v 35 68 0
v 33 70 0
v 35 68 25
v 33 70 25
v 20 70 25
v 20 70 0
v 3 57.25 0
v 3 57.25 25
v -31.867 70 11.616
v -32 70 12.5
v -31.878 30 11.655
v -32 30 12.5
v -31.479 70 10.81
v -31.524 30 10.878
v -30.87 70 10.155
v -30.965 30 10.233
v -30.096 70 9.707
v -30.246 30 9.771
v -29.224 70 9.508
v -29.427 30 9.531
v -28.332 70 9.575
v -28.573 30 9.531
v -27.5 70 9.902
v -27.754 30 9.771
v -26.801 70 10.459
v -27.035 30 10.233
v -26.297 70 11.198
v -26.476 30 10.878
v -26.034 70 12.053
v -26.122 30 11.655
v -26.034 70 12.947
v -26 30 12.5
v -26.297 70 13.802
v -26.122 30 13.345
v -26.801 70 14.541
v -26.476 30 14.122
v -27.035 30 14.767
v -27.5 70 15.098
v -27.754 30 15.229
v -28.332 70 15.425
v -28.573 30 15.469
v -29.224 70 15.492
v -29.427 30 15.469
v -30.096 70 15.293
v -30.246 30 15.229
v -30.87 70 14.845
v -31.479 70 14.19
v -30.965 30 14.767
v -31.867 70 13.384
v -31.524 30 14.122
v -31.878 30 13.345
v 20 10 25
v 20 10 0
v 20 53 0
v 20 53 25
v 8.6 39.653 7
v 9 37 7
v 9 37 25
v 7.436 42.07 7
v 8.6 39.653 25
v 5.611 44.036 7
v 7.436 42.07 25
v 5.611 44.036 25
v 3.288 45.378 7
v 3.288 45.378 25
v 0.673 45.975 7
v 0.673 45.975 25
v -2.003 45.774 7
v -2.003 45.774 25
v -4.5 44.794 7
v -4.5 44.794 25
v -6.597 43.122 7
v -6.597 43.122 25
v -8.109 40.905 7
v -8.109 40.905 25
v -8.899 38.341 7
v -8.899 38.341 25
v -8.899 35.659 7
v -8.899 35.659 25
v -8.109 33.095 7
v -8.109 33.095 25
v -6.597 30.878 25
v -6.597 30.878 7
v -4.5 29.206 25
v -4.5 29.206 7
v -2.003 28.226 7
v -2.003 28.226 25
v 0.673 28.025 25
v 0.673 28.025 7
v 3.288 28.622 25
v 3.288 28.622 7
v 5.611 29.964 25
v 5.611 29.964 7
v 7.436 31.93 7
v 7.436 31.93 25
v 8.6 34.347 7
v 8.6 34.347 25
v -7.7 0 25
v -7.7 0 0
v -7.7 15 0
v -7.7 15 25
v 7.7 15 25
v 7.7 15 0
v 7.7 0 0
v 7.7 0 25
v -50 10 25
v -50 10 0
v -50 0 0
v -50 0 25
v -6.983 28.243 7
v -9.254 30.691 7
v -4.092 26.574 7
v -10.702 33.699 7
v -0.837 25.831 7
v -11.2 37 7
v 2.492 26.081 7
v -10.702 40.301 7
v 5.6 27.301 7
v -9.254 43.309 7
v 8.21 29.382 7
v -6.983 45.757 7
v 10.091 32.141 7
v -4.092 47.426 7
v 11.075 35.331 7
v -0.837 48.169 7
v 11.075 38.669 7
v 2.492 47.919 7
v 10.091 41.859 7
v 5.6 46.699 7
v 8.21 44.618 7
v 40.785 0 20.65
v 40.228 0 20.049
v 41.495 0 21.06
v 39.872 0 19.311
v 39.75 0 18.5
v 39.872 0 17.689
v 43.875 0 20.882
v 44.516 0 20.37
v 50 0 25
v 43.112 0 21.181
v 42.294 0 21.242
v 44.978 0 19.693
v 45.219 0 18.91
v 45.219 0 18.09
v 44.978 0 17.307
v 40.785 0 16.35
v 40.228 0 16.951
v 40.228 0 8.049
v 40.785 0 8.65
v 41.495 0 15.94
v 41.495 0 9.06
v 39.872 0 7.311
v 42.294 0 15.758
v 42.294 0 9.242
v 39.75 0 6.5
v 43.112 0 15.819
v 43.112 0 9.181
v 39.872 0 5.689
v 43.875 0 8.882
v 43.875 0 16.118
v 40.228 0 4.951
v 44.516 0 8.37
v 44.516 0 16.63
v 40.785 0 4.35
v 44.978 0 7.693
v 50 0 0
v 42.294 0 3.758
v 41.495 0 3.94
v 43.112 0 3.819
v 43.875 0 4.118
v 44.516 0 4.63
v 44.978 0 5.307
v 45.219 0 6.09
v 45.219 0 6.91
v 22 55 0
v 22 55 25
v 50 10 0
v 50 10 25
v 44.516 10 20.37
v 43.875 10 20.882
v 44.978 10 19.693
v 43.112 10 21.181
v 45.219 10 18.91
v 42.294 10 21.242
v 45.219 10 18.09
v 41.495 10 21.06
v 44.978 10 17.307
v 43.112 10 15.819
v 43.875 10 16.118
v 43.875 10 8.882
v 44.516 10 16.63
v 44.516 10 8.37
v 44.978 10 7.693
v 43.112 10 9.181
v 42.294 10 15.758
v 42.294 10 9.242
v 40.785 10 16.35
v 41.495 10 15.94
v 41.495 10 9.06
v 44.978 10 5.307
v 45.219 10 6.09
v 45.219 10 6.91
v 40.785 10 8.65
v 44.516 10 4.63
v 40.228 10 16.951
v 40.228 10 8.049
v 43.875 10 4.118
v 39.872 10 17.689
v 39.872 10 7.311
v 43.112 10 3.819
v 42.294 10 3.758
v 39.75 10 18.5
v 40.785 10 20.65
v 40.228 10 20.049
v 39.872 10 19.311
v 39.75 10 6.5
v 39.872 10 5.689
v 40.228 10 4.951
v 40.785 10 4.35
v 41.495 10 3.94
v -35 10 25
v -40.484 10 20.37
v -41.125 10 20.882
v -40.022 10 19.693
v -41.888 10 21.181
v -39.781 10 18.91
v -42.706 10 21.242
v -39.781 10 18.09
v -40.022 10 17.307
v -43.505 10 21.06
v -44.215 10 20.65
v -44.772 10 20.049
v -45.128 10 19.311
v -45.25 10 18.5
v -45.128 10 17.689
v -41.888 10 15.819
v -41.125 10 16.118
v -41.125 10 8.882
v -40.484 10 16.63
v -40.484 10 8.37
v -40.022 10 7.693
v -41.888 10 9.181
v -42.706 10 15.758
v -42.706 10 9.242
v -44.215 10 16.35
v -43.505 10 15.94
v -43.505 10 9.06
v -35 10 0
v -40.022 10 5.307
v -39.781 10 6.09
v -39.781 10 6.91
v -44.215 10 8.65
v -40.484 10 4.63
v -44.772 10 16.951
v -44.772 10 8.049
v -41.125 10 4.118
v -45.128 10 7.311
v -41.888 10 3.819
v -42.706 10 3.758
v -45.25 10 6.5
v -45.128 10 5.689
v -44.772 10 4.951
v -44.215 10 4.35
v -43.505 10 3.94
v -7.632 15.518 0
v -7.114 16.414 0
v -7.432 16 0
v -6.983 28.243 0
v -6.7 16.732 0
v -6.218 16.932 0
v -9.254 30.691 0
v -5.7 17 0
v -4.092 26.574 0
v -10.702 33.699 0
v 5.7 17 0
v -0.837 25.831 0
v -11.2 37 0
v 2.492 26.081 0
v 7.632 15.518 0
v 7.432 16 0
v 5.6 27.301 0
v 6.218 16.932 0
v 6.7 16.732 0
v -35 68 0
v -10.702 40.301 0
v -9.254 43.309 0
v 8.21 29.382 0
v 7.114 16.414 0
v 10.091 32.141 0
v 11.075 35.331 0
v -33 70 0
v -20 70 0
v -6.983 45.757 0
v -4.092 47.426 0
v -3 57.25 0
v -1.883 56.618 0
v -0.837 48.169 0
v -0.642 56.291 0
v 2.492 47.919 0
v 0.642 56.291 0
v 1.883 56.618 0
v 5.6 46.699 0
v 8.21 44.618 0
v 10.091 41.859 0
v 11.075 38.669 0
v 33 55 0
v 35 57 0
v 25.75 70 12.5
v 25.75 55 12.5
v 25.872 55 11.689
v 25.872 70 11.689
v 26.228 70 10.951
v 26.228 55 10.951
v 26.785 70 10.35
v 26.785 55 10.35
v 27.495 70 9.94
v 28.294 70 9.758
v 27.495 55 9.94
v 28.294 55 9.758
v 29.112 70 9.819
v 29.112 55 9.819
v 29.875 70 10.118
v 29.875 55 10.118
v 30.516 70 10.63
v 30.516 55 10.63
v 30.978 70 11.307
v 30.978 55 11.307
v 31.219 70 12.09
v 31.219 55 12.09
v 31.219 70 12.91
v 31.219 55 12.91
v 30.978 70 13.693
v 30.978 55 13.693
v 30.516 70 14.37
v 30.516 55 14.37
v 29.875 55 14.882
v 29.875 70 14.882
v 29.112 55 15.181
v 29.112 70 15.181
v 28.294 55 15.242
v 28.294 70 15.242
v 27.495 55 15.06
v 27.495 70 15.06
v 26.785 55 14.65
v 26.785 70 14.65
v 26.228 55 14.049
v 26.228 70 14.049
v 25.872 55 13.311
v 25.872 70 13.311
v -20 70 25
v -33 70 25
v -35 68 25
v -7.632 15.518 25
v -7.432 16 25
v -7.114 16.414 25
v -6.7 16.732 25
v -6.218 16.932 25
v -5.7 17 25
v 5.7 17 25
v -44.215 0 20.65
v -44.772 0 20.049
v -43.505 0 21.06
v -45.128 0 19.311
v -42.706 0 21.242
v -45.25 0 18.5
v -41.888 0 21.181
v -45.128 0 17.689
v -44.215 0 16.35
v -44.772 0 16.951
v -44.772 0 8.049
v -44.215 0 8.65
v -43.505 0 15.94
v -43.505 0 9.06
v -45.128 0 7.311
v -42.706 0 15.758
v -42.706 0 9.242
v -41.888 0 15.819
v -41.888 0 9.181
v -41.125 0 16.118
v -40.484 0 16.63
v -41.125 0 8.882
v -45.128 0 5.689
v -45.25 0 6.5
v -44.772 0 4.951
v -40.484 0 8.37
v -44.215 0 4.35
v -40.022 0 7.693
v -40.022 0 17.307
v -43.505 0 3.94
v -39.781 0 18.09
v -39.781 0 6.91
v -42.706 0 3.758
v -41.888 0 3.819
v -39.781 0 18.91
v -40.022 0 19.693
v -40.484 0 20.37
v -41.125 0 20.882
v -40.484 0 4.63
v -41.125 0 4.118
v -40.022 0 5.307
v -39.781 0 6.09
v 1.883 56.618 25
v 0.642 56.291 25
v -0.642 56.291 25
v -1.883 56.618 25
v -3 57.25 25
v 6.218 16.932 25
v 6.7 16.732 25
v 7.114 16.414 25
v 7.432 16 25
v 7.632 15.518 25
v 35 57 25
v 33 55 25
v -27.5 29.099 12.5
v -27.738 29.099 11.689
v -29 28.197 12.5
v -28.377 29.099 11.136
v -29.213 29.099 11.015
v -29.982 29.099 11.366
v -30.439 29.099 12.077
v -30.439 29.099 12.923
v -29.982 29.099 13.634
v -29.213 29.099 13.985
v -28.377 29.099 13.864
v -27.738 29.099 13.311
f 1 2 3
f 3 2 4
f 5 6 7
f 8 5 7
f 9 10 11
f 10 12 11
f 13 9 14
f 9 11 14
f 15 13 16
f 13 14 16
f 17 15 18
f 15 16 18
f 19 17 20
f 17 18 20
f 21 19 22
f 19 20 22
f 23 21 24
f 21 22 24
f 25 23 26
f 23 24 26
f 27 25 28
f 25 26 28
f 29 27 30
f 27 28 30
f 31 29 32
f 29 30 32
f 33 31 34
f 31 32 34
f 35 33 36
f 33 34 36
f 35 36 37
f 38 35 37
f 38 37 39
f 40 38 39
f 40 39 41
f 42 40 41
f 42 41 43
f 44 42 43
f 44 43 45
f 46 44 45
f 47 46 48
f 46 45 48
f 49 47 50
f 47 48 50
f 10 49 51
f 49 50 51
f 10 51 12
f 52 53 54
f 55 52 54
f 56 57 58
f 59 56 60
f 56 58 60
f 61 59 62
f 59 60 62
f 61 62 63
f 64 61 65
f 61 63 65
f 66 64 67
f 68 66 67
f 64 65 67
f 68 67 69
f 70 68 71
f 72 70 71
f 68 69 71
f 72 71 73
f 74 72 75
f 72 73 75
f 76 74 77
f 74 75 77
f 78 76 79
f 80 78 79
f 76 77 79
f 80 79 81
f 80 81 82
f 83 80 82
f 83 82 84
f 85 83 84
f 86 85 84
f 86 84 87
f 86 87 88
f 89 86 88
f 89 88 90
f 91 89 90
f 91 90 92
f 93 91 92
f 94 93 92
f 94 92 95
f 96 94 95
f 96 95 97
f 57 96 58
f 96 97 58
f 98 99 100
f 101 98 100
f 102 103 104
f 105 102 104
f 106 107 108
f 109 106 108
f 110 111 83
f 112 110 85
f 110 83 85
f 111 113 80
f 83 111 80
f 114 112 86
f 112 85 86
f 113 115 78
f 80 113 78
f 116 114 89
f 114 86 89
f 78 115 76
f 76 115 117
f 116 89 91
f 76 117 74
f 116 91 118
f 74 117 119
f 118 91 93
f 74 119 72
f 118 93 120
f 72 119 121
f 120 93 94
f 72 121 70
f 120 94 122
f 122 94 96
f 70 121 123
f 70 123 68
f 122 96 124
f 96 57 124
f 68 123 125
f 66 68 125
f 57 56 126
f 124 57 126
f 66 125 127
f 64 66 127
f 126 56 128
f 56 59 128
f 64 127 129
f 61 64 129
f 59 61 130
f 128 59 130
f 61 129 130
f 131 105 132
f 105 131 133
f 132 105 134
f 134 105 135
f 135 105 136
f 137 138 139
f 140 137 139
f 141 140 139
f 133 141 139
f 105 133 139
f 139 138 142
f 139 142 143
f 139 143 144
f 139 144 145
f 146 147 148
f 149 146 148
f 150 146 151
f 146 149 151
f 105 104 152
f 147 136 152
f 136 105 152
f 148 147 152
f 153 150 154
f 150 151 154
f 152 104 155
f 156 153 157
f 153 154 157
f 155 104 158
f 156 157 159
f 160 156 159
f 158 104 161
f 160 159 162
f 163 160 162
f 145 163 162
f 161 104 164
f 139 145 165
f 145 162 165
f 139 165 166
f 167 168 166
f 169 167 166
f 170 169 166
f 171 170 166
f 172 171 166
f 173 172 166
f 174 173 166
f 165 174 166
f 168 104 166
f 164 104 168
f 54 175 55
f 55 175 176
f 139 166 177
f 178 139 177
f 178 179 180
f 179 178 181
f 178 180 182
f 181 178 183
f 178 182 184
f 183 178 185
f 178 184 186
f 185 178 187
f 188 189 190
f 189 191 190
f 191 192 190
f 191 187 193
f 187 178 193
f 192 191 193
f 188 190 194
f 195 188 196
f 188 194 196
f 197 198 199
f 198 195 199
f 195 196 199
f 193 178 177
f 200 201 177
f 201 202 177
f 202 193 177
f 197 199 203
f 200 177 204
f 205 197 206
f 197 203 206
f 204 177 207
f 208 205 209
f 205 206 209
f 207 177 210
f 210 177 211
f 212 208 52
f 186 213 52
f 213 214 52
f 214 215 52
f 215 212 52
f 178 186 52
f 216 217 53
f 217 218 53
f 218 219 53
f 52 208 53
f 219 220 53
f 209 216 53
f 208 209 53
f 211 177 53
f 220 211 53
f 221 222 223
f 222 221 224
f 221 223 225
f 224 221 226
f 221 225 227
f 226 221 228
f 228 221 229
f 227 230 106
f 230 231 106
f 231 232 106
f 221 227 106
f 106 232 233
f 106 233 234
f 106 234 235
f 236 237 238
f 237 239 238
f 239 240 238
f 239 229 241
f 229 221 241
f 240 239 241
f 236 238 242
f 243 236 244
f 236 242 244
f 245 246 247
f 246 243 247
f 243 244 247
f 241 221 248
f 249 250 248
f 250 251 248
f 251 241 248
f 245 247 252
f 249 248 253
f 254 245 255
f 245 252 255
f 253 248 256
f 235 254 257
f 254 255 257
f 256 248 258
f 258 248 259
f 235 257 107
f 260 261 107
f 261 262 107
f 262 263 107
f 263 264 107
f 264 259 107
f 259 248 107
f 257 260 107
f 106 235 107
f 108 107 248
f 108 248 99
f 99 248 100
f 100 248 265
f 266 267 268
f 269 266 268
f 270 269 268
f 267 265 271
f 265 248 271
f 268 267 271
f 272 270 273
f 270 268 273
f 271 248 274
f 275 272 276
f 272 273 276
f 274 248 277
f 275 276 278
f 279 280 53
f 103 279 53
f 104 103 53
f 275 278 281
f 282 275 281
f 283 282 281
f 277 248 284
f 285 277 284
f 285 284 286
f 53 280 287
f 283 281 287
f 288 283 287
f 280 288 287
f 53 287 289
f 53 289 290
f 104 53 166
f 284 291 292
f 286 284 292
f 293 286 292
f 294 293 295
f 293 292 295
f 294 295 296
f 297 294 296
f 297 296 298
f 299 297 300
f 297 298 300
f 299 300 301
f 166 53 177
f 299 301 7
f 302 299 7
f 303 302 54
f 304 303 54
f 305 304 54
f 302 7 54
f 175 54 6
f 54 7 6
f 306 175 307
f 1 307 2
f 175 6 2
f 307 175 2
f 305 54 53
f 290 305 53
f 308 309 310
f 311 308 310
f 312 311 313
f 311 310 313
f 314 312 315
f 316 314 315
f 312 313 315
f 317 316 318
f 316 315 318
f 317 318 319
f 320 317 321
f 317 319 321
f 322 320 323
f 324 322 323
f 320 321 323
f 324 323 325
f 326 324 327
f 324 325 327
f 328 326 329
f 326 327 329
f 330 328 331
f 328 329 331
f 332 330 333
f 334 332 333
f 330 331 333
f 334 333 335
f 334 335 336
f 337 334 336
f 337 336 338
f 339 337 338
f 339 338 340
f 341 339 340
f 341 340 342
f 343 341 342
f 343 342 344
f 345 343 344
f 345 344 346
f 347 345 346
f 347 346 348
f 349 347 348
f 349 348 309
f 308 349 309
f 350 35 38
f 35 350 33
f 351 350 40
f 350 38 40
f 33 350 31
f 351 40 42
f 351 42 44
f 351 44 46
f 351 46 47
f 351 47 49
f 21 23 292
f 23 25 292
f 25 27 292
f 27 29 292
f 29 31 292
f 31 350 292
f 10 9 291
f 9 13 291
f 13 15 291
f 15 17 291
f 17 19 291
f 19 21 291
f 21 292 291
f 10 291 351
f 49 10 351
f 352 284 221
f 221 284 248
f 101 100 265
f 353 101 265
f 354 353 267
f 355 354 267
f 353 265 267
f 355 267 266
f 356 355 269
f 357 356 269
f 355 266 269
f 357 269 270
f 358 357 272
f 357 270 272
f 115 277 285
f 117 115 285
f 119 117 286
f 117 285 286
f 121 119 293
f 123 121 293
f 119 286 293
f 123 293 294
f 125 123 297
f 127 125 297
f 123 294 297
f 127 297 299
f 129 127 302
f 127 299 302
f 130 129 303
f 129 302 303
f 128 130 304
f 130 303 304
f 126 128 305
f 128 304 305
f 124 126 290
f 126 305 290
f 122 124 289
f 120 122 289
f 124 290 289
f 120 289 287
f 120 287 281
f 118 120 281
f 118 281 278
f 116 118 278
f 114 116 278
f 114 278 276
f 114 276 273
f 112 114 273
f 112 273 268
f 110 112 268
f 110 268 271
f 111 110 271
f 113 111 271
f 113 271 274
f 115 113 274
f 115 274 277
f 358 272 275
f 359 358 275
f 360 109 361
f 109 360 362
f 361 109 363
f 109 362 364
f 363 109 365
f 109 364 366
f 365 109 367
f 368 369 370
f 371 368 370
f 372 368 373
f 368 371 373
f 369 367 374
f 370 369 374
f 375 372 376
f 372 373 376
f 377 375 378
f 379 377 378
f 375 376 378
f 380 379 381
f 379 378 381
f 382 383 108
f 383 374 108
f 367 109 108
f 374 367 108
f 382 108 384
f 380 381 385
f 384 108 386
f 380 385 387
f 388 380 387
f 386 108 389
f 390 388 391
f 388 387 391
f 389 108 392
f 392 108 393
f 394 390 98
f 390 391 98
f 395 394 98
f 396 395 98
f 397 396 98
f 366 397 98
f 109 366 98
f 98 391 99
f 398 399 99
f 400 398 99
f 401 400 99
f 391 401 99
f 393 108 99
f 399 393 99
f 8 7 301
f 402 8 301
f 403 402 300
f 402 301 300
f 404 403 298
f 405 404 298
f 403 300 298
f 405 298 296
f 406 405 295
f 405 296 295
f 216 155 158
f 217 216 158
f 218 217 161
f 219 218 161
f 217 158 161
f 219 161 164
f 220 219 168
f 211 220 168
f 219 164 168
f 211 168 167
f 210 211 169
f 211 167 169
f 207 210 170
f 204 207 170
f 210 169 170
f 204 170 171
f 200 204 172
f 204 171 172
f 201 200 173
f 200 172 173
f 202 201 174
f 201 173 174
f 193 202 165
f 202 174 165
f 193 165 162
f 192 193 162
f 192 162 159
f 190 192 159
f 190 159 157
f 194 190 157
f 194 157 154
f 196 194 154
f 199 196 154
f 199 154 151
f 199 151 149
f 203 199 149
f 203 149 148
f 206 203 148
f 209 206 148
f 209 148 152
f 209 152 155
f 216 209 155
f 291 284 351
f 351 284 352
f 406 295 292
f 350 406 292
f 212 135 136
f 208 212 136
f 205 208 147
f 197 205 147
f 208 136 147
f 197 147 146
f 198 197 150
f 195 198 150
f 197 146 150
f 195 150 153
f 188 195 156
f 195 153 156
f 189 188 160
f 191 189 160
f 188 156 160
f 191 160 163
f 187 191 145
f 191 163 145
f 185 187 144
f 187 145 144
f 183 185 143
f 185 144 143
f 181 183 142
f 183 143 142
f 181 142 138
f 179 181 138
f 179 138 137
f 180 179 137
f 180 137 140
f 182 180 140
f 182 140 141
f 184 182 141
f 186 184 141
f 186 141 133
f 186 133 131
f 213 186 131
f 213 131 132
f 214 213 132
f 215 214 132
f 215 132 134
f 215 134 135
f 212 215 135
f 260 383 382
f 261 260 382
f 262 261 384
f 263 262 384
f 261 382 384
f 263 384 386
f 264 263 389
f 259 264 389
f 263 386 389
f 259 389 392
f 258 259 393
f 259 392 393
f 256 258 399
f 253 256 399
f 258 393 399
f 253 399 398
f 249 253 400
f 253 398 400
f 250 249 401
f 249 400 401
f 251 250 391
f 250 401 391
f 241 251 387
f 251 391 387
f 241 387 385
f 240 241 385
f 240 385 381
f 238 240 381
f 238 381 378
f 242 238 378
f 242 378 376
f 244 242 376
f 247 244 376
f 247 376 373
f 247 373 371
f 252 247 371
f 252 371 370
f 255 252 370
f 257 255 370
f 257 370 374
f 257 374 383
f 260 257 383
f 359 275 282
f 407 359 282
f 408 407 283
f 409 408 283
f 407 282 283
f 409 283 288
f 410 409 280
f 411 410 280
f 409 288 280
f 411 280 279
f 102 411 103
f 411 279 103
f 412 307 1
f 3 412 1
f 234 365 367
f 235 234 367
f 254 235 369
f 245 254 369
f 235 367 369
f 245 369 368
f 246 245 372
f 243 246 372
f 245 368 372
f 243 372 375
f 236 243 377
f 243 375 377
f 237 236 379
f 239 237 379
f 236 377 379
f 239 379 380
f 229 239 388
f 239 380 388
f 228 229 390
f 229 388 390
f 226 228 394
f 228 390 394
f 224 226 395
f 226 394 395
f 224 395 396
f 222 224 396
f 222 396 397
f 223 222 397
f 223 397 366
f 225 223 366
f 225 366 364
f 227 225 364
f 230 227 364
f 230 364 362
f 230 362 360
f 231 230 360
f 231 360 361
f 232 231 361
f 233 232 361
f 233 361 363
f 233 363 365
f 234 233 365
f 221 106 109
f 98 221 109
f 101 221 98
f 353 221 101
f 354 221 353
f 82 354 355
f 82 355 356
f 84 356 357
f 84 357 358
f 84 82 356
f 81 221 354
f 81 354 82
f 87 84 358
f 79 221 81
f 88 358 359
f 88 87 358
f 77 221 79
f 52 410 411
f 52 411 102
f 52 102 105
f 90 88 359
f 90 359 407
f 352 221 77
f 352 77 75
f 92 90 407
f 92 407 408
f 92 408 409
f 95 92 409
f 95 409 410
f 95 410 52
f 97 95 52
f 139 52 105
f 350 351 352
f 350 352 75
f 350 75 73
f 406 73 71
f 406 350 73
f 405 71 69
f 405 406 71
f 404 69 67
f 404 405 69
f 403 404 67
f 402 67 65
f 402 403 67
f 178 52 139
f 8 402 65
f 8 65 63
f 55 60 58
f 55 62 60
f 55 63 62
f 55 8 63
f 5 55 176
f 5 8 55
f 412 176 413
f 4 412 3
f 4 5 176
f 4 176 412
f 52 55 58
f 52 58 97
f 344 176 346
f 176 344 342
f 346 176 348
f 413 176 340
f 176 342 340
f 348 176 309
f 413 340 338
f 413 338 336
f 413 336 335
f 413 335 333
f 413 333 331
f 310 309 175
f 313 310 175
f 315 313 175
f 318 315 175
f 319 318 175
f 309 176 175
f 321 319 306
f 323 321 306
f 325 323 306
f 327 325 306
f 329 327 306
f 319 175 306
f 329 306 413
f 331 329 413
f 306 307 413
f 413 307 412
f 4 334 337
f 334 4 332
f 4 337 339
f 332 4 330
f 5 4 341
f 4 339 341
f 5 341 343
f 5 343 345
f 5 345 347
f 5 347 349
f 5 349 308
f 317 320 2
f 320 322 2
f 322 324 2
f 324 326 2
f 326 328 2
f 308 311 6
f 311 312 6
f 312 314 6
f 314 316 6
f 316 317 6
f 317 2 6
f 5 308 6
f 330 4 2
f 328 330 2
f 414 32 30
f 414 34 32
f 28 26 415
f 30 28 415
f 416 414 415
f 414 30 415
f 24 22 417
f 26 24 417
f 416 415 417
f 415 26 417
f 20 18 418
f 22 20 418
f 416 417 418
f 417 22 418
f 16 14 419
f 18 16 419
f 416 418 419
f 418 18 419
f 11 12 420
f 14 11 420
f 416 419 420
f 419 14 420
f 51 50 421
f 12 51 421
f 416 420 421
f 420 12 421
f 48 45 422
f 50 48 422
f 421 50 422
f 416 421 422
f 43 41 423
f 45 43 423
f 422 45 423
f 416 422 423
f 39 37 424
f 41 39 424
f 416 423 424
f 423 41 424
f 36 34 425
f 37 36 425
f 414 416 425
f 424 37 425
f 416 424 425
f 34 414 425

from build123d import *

# Parameters (mm, degrees)
BOSS_EXTRUDE1_DEPTH       = 25
SKETCH2_R                 = 11.2
CUT_EXTRUDE1_DEPTH        = 90.582364336
CHAMFER2_SIZE             = 2
SKETCH11_R                = 11.4
SKETCH11_R_2              = 9
BOSS_EXTRUDE3_DEPTH       = 18
M5_CLEARANCE_HOLE1_D      = 5.5
M5_CLEARANCE_HOLE2_D      = 5.5
M5_CLEARANCE_HOLE2_DEPTH  = 15
F_6_0MM_DOWEL_HOLE1_D     = 6
F_6_0MM_DOWEL_HOLE1_DEPTH = 40
F_6_0MM_DOWEL_HOLE1_TIP   = 1.802581857


with BuildPart() as part:
    # Sketch1 → Boss-Extrude1 (new body)
    with BuildSketch(Plane.XY):
        with BuildLine():
            Line((50, 0), (50, 10))
            Line((50, 10), (35, 10))
            Line((35, 10), (20, 10))
            Line((20, 10), (20, 55))
            Line((20, 55), (35, 55))
            Line((35, 55), (35, 70))
            Line((35, 70), (20, 70))
            Line((20, 70), (3, 57.25))
            ThreePointArc((3, 57.25), (0, 56.25), (-3, 57.25))
            Line((-3, 57.25), (-20, 70))
            Line((-20, 70), (-35, 70))
            Line((-35, 70), (-35, 10))
            Line((-35, 10), (-50, 10))
            Line((-50, 10), (-50, 0))
            Line((-50, 0), (-7.7, 0))
            Line((-7.7, 0), (-7.7, 15))
            ThreePointArc((-7.7, 15), (-7.114213562, 16.414213562), (-5.7, 17))
            Line((-5.7, 17), (5.7, 17))
            ThreePointArc((5.7, 17), (7.114213562, 16.414213562), (7.7, 15))
            Line((7.7, 15), (7.7, 0))
            Line((7.7, 0), (50, 0))
        make_face()
    extrude(amount=BOSS_EXTRUDE1_DEPTH)

    # Sketch2 → Cut-Extrude1 (cut, through all)
    with BuildSketch(Plane(origin=(0, 0, 0), x_dir=(-1, 0, 0), z_dir=(0, 0, -1))):
        with Locations((0, 37)):
            Circle(SKETCH2_R)
    extrude(amount=-CUT_EXTRUDE1_DEPTH, mode=Mode.SUBTRACT)

    # Chamfer2
    chamfer2_edges = [part.edges().sort_by_distance(p)[0] for p in [
        (-35, 70, 12.5),
        (35, 70, 12.5),
        (35, 55, 12.5),
        (20, 55, 12.5),
    ]]
    chamfer(chamfer2_edges, length=CHAMFER2_SIZE)

    # Sketch11 → Boss-Extrude3 (add)
    with BuildSketch(Plane.XY.offset(25)):
        with Locations((0, 37)):
            Circle(SKETCH11_R)
        with Locations((0, 37)):
            Circle(SKETCH11_R_2, mode=Mode.SUBTRACT)
    extrude(amount=-BOSS_EXTRUDE3_DEPTH)

    # M5 Clearance Hole1 (through all)
    with Locations(Plane(origin=(0, 10, 0), x_dir=(1, 0, 0), z_dir=(0, 1, 0))):
        with Locations((42.5, -18.5), (42.5, -6.5), (-42.5, -18.5), (-42.5, -6.5)):
            Hole(M5_CLEARANCE_HOLE1_D / 2)

    # M5 Clearance Hole2
    with Locations(Plane(origin=(0, 70, 0), x_dir=(1, 0, 0), z_dir=(0, 1, 0))):
        with Locations((28.5, -12.5)):
            Hole(M5_CLEARANCE_HOLE2_D / 2, depth=M5_CLEARANCE_HOLE2_DEPTH)

    # Ø6.0mm Dowel Hole1
    with Locations(Plane(origin=(0, 70, 0), x_dir=(1, 0, 0), z_dir=(0, 1, 0))):
        with Locations((-29, -12.5)):
            Hole(F_6_0MM_DOWEL_HOLE1_D / 2, depth=F_6_0MM_DOWEL_HOLE1_DEPTH)
            with Locations((0, 0, -(F_6_0MM_DOWEL_HOLE1_DEPTH + F_6_0MM_DOWEL_HOLE1_TIP / 2))):  # 118° drill point
                Cone(0, F_6_0MM_DOWEL_HOLE1_D / 2, F_6_0MM_DOWEL_HOLE1_TIP, mode=Mode.SUBTRACT)


solid = part.part
